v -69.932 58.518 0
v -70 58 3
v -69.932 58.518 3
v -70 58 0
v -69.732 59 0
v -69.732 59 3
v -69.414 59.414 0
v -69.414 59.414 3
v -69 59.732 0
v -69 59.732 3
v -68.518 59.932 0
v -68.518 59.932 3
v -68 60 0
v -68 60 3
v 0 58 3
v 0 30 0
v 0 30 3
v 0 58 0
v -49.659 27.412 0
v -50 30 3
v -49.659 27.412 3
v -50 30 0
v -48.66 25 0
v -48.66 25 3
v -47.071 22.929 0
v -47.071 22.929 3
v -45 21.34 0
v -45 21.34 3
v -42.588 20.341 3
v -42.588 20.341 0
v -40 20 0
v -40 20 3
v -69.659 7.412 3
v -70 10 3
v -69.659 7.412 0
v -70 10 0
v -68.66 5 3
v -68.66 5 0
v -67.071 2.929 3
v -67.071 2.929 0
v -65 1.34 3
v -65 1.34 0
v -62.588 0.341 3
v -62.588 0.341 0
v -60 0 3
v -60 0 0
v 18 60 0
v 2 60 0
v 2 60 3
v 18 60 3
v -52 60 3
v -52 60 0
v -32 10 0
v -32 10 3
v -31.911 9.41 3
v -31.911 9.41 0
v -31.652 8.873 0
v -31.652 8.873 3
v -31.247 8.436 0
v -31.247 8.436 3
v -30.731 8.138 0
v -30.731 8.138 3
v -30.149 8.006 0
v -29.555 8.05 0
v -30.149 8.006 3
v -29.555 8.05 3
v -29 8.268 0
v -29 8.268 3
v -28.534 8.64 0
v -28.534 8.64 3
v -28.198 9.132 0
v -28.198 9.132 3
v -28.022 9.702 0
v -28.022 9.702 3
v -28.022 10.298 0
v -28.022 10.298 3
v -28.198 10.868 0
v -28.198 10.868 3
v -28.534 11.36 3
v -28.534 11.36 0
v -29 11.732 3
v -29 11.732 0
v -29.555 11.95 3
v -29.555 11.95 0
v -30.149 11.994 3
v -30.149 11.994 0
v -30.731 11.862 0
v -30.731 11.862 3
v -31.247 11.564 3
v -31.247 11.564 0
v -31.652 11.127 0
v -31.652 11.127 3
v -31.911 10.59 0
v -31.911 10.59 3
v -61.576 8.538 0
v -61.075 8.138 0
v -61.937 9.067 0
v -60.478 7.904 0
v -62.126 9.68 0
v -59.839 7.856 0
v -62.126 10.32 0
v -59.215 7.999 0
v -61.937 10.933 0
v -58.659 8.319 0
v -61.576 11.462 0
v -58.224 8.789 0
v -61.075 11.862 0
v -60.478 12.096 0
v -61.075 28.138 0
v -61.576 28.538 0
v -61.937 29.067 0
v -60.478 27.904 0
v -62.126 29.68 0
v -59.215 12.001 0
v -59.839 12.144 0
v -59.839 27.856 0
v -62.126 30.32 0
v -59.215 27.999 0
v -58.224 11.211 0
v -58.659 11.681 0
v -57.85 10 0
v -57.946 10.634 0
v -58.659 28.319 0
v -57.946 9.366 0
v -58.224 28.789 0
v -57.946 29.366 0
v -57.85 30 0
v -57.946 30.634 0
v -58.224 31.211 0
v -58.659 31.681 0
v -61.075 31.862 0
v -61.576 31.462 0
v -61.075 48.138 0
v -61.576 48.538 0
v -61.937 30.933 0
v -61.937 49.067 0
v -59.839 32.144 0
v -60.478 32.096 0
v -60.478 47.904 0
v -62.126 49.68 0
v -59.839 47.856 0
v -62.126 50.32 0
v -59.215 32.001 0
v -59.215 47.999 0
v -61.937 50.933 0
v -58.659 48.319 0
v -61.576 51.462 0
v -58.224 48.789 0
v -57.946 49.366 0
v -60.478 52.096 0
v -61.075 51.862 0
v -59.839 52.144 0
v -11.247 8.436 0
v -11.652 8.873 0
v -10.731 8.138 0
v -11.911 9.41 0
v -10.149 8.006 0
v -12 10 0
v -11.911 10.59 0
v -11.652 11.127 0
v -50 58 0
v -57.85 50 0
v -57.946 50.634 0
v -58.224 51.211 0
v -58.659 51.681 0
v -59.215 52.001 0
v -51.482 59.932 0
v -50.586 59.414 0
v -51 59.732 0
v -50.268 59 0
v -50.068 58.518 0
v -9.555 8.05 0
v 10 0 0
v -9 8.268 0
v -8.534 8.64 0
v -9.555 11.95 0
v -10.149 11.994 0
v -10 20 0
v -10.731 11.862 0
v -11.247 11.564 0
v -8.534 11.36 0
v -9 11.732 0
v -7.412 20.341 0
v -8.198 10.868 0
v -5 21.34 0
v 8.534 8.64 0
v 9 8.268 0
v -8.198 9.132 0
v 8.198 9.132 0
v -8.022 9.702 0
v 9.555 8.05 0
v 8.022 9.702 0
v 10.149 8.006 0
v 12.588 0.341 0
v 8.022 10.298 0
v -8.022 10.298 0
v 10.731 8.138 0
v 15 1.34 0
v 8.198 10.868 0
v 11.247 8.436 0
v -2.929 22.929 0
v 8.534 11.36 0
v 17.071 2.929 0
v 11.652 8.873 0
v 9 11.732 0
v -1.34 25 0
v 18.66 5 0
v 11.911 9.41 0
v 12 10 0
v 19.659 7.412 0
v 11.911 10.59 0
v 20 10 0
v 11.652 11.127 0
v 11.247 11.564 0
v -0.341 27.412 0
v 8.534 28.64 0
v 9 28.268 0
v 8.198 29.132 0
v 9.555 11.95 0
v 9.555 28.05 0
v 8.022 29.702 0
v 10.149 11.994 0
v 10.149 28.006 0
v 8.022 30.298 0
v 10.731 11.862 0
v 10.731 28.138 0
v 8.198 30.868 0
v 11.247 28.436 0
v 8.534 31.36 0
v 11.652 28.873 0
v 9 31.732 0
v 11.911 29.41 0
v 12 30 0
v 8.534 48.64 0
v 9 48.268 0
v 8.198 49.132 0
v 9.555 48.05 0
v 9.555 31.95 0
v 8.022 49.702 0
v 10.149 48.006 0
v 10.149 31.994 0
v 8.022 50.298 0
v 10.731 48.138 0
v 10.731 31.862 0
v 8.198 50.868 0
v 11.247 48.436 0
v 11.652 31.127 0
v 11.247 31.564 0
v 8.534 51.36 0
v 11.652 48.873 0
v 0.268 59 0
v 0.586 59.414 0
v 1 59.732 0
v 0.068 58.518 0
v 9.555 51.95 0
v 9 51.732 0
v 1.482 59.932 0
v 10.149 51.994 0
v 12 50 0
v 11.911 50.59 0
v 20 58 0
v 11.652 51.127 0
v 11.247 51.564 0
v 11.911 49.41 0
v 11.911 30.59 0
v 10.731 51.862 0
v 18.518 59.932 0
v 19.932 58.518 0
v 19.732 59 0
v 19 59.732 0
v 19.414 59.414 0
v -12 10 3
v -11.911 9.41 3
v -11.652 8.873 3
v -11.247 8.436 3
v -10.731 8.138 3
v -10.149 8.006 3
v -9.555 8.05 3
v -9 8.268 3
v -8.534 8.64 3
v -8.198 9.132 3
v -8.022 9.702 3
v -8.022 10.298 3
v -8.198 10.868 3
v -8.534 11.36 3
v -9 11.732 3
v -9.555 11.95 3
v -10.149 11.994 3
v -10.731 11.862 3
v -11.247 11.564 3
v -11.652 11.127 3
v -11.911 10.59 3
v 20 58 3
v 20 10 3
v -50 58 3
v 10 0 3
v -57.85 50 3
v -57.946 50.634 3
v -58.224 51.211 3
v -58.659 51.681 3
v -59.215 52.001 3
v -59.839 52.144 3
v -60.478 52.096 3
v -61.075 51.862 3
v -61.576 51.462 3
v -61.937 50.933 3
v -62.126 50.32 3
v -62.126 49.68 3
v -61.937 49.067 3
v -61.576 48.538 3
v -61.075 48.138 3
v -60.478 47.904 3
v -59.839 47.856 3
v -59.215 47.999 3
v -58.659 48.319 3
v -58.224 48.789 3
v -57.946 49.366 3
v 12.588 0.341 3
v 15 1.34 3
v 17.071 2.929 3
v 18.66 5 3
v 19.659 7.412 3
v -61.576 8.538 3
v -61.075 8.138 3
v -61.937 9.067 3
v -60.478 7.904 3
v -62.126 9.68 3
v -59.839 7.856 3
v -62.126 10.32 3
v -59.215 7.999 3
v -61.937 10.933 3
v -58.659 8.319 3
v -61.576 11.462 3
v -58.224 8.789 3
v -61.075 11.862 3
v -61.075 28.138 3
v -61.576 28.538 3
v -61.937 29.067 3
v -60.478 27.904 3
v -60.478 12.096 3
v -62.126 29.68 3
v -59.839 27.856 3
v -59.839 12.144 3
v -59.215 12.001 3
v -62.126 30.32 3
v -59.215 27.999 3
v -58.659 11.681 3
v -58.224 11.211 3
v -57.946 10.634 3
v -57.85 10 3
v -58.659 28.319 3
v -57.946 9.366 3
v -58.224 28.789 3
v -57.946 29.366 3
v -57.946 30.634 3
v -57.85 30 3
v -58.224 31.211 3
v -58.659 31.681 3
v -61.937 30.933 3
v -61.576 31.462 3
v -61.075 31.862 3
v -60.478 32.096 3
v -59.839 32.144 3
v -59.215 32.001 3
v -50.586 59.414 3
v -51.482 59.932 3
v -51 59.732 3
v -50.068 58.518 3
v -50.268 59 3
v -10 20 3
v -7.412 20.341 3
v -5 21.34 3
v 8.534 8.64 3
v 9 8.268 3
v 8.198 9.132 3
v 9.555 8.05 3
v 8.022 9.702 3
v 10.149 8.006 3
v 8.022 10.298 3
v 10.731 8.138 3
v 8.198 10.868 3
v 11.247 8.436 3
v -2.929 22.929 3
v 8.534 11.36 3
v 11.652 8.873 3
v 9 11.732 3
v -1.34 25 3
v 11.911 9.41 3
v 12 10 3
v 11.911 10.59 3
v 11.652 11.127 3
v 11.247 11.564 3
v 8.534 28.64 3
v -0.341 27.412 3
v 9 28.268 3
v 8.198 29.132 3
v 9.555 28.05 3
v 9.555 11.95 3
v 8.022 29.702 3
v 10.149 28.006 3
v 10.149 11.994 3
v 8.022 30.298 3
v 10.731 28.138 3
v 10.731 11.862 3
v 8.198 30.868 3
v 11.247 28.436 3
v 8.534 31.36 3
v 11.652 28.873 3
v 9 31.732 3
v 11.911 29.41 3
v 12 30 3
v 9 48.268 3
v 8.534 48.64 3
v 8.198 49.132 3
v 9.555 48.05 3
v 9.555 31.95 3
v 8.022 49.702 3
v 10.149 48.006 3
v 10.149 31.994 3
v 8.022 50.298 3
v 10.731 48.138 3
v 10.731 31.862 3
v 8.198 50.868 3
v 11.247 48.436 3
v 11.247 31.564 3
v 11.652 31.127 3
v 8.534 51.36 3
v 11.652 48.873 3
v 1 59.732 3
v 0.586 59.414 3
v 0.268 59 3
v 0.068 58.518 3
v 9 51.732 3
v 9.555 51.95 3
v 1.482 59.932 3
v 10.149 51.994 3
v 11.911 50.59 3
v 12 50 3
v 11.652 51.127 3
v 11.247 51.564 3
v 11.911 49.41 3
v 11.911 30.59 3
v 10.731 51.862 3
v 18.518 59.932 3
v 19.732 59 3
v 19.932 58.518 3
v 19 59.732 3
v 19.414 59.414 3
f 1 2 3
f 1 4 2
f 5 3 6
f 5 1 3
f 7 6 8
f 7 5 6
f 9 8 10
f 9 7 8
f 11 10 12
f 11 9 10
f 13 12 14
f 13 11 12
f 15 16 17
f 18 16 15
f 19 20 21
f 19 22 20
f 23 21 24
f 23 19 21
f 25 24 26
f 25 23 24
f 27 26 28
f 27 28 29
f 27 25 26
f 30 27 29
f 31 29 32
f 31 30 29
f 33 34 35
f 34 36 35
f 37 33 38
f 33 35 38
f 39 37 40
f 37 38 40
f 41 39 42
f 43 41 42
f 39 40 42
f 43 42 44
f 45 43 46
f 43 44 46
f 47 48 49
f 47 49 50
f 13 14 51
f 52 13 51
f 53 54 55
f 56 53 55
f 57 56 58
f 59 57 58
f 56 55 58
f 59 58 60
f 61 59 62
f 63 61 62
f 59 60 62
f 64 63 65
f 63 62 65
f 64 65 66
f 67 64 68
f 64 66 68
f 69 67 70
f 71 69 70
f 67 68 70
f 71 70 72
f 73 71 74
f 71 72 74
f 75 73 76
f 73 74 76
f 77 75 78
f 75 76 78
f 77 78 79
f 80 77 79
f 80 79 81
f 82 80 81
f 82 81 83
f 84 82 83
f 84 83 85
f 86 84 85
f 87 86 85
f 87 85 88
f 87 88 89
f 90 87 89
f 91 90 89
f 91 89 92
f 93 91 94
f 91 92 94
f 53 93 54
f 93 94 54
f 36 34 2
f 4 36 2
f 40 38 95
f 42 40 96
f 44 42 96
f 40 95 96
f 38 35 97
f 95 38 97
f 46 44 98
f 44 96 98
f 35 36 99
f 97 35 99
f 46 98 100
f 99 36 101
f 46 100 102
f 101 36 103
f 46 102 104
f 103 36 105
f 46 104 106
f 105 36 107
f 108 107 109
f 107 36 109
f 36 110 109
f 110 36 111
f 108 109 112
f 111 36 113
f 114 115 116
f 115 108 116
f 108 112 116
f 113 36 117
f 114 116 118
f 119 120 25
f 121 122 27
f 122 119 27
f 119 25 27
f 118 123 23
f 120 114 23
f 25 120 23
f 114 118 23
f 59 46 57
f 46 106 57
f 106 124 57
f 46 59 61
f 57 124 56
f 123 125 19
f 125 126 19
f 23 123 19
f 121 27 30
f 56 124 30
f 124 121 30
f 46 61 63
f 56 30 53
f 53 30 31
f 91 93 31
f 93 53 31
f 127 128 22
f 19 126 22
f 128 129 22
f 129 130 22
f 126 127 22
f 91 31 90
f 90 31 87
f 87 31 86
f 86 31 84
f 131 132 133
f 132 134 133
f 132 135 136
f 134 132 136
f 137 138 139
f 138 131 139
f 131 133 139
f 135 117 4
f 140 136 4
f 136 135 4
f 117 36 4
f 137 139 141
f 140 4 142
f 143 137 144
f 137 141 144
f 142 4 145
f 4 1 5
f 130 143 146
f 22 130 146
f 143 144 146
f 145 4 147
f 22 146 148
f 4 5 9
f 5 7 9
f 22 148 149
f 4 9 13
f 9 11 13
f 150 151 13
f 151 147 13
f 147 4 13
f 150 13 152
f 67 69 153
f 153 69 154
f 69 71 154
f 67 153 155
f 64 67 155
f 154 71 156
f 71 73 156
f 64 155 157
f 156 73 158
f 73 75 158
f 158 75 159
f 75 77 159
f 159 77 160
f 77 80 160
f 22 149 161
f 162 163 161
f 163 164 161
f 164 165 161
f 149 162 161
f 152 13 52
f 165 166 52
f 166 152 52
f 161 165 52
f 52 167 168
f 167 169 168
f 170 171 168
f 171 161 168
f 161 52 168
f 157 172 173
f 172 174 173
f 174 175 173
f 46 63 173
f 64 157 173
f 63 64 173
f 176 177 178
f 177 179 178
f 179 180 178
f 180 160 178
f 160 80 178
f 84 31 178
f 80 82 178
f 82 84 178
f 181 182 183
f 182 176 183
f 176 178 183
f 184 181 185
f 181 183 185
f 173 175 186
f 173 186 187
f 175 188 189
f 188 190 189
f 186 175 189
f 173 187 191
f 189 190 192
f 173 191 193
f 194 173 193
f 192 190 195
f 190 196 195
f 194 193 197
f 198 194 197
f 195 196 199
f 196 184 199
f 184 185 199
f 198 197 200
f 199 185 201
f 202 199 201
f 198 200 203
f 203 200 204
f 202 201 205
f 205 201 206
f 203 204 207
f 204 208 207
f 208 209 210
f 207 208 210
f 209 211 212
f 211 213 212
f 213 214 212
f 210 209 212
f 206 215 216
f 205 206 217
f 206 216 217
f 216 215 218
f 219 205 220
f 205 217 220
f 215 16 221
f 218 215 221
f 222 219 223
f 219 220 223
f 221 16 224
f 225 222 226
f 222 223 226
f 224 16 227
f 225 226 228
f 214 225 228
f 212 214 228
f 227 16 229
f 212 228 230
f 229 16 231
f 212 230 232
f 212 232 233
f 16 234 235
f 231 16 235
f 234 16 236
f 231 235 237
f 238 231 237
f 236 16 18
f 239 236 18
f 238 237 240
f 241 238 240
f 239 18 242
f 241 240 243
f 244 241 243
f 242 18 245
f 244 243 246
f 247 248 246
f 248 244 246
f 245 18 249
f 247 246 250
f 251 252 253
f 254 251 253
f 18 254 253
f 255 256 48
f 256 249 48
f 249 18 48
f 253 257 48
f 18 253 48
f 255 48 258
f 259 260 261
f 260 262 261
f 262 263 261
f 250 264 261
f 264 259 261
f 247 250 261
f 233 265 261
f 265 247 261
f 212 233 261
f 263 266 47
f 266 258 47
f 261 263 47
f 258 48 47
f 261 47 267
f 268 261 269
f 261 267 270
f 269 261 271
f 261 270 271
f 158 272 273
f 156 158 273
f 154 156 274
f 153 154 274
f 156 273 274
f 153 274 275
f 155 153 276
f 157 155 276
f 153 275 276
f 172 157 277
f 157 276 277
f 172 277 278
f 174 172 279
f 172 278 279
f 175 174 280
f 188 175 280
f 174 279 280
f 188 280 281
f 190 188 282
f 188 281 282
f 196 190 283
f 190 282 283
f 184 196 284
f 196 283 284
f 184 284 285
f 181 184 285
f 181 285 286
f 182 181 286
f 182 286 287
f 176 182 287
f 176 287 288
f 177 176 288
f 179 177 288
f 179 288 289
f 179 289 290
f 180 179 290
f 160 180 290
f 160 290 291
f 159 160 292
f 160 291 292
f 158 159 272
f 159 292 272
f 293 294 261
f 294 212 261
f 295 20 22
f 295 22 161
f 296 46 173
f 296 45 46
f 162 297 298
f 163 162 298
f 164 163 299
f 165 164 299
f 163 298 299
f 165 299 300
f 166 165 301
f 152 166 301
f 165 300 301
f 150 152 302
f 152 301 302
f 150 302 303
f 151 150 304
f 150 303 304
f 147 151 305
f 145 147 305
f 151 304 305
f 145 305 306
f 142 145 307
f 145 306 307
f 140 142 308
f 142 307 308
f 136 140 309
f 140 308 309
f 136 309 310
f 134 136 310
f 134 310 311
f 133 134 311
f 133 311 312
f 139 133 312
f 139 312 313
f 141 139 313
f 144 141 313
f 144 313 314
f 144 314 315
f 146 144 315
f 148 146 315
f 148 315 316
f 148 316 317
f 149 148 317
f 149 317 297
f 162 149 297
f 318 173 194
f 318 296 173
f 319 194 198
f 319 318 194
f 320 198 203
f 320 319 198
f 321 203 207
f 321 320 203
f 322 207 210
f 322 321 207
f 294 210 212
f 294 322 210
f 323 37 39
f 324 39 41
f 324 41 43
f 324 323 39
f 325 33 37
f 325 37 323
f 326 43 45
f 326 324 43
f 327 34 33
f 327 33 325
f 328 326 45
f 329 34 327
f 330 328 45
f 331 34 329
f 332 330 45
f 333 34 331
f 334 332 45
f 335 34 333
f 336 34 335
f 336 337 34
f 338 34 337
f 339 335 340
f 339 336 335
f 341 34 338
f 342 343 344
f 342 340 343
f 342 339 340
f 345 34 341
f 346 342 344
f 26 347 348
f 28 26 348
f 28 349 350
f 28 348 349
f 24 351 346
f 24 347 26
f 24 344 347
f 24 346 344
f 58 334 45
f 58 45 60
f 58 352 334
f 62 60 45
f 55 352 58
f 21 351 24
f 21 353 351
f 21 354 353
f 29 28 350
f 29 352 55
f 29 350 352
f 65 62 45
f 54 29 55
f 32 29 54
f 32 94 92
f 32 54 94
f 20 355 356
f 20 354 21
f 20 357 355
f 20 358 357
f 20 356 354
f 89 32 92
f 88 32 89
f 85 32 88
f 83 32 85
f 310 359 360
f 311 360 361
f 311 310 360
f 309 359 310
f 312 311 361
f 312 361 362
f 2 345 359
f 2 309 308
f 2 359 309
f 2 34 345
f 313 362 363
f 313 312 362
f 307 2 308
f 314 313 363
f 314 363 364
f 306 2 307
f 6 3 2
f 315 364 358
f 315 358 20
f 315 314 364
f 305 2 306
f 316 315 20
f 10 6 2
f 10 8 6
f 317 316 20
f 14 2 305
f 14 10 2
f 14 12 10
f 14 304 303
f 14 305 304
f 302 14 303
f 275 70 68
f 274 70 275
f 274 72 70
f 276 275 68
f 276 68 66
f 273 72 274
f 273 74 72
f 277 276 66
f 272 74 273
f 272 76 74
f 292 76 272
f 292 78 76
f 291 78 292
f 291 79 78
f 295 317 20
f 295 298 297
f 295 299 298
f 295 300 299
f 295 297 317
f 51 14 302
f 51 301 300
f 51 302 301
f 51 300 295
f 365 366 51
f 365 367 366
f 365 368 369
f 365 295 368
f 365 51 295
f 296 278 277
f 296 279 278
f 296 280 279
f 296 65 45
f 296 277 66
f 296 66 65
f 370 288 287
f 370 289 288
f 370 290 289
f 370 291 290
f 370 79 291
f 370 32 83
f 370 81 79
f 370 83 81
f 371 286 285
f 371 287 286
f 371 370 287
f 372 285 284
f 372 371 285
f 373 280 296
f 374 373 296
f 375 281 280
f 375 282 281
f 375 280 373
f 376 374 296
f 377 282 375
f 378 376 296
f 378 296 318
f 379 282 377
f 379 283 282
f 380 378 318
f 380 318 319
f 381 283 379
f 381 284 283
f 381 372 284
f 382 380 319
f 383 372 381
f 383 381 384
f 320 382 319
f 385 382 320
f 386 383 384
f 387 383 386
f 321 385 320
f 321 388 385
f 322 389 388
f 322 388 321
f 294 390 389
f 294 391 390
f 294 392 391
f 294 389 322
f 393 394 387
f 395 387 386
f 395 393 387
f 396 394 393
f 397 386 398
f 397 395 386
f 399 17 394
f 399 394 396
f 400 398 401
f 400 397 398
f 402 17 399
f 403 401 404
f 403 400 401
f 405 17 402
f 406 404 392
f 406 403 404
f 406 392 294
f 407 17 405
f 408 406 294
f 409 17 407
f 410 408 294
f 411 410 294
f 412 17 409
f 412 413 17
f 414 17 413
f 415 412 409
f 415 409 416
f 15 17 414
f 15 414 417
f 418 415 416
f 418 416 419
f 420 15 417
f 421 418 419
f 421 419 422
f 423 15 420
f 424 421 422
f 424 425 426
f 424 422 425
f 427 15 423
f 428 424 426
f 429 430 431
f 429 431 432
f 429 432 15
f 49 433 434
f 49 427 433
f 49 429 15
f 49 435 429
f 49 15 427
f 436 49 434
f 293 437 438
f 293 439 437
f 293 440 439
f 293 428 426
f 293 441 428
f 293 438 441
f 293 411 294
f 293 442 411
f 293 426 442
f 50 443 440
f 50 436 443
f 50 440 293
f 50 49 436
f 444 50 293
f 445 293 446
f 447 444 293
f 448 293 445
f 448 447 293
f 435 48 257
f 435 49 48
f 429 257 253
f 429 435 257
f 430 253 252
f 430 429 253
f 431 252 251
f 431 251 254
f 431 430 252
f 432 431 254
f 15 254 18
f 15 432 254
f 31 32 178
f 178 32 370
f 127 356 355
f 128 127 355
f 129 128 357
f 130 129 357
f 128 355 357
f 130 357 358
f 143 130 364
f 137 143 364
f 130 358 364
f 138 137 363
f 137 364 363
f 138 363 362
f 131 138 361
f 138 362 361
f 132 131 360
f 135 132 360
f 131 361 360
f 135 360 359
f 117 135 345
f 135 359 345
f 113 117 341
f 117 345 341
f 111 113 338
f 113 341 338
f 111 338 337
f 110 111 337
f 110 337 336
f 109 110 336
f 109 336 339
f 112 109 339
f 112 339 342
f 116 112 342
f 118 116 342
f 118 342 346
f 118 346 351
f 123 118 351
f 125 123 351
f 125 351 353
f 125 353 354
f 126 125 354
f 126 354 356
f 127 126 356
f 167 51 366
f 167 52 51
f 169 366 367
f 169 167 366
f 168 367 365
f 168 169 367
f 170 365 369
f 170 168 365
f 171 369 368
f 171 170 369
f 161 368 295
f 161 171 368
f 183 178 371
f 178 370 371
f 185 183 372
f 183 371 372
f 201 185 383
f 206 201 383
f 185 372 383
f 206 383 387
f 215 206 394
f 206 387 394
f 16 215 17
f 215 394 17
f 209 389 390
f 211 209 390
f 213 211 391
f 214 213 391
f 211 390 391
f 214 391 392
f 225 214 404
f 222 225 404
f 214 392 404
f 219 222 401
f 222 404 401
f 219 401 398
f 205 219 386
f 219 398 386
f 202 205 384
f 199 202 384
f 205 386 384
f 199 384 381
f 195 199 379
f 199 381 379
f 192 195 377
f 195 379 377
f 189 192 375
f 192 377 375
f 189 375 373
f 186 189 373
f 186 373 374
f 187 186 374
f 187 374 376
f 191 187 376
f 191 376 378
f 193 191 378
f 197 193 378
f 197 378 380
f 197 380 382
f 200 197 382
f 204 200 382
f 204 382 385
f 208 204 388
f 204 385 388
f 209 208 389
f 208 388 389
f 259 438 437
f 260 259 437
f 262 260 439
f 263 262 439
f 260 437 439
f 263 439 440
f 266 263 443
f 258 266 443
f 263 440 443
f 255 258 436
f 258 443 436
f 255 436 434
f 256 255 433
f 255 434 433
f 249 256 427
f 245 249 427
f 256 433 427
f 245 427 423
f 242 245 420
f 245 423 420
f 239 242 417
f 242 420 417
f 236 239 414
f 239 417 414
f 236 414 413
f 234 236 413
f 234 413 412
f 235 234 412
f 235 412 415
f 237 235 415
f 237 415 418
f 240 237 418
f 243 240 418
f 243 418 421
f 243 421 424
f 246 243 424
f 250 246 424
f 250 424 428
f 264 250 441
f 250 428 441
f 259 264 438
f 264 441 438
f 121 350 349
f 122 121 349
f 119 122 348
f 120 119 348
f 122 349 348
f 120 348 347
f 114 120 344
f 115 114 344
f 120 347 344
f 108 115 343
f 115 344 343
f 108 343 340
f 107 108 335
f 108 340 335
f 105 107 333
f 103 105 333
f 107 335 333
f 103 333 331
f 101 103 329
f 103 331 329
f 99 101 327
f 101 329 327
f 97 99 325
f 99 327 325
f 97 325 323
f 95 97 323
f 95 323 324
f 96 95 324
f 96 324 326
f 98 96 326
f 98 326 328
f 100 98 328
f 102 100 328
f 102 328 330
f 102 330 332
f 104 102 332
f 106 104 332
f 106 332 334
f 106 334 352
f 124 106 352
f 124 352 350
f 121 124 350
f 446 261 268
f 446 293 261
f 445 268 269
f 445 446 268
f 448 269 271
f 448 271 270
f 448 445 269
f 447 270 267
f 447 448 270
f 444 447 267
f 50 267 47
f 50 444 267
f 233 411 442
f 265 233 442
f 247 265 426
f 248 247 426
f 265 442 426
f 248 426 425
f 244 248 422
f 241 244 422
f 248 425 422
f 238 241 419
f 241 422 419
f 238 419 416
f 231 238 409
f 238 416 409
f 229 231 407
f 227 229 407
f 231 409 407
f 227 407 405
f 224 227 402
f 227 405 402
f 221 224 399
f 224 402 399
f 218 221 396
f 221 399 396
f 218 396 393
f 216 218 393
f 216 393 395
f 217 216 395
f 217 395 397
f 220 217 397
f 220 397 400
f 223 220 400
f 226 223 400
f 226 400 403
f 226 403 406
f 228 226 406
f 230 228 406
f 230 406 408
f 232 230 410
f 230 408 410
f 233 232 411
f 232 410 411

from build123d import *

# Parameters (mm, degrees)
SKETCH_1_W          = 20
SKETCH_1_H          = 60
EXTRUDE_1_DEPTH     = 3
SKETCH_2_W          = 60
SKETCH_2_H          = 20
EXTRUDE_2_DEPTH     = 3
SKETCH_3_R          = 2
CUT_EXTRUDE_1_DEPTH = 3
FILLET_1_R          = 10
SKETCH_4_W          = 20
SKETCH_4_H          = 60
SKETCH_4_W_2        = 10
SKETCH_4_H_2        = 20
EXTRUDE_3_DEPTH     = 3
SKETCH_5_R          = 2.15
CUT_EXTRUDE_2_DEPTH = 93.244241013
FILLET_3_R          = 10
FILLET_4_R          = 2


with BuildPart() as part:
    # 草图1 → 凸台-拉伸1 (new body)
    with BuildSketch(Plane.XY):
        with Locations((10, 30)):
            Rectangle(SKETCH_1_W, SKETCH_1_H)
    extrude(amount=EXTRUDE_1_DEPTH)

    # 草图2 → 凸台-拉伸2 (add)
    with BuildSketch(Plane.XY.offset(3)):
        with Locations((-10, 10)):
            Rectangle(SKETCH_2_W, SKETCH_2_H)
    extrude(amount=-EXTRUDE_2_DEPTH)

    # 草图3 → 切除-拉伸1 (cut)
    with BuildSketch(Plane.XY.offset(3)):
        with Locations((10, 10)):
            Circle(SKETCH_3_R)
        with Locations((10, 30)):
            Circle(SKETCH_3_R)
        with Locations((10, 50)):
            Circle(SKETCH_3_R)
        with Locations(Location((-10, 10, 0), (0, 0, 180))):
            Circle(SKETCH_3_R)
        with Locations(Location((-30, 10, 0), (0, 0, 180))):
            Circle(SKETCH_3_R)
    extrude(amount=-CUT_EXTRUDE_1_DEPTH, mode=Mode.SUBTRACT)

    # 圆角1
    fillet_1_edges = [part.edges().sort_by_distance(p)[0] for p in [
        (0, 20, 1.5),
        (20, 0, 1.5),
    ]]
    fillet(fillet_1_edges, radius=FILLET_1_R)

    # 草图4 → 凸台-拉伸3 (add, through all)
    with BuildSketch(Plane.XY.offset(3)):
        with Locations((-60, 30)):
            Rectangle(SKETCH_4_W, SKETCH_4_H)
        with Locations((-45, 10)):
            Rectangle(SKETCH_4_W_2, SKETCH_4_H_2)
    extrude(amount=-EXTRUDE_3_DEPTH)

    # 草图5 → 切除-拉伸2 (cut, through all)
    with BuildSketch(Plane.XY.offset(3)):
        with Locations((-60, 10)):
            Circle(SKETCH_5_R)
        with Locations((-60, 30)):
            Circle(SKETCH_5_R)
        with Locations((-60, 50)):
            Circle(SKETCH_5_R)
    extrude(amount=-CUT_EXTRUDE_2_DEPTH, mode=Mode.SUBTRACT)

    # 圆角3
    fillet_3_edges = [part.edges().sort_by_distance(p)[0] for p in [
        (-50, 20, 1.5),
        (-70, 0, 1.5),
    ]]
    fillet(fillet_3_edges, radius=FILLET_3_R)

    # 圆角4
    fillet_4_edges = [part.edges().sort_by_distance(p)[0] for p in [
        (-50, 60, 1.5),
        (-70, 60, 1.5),
        (0, 60, 1.5),
        (20, 60, 1.5),
    ]]
    fillet(fillet_4_edges, radius=FILLET_4_R)


solid = part.part
